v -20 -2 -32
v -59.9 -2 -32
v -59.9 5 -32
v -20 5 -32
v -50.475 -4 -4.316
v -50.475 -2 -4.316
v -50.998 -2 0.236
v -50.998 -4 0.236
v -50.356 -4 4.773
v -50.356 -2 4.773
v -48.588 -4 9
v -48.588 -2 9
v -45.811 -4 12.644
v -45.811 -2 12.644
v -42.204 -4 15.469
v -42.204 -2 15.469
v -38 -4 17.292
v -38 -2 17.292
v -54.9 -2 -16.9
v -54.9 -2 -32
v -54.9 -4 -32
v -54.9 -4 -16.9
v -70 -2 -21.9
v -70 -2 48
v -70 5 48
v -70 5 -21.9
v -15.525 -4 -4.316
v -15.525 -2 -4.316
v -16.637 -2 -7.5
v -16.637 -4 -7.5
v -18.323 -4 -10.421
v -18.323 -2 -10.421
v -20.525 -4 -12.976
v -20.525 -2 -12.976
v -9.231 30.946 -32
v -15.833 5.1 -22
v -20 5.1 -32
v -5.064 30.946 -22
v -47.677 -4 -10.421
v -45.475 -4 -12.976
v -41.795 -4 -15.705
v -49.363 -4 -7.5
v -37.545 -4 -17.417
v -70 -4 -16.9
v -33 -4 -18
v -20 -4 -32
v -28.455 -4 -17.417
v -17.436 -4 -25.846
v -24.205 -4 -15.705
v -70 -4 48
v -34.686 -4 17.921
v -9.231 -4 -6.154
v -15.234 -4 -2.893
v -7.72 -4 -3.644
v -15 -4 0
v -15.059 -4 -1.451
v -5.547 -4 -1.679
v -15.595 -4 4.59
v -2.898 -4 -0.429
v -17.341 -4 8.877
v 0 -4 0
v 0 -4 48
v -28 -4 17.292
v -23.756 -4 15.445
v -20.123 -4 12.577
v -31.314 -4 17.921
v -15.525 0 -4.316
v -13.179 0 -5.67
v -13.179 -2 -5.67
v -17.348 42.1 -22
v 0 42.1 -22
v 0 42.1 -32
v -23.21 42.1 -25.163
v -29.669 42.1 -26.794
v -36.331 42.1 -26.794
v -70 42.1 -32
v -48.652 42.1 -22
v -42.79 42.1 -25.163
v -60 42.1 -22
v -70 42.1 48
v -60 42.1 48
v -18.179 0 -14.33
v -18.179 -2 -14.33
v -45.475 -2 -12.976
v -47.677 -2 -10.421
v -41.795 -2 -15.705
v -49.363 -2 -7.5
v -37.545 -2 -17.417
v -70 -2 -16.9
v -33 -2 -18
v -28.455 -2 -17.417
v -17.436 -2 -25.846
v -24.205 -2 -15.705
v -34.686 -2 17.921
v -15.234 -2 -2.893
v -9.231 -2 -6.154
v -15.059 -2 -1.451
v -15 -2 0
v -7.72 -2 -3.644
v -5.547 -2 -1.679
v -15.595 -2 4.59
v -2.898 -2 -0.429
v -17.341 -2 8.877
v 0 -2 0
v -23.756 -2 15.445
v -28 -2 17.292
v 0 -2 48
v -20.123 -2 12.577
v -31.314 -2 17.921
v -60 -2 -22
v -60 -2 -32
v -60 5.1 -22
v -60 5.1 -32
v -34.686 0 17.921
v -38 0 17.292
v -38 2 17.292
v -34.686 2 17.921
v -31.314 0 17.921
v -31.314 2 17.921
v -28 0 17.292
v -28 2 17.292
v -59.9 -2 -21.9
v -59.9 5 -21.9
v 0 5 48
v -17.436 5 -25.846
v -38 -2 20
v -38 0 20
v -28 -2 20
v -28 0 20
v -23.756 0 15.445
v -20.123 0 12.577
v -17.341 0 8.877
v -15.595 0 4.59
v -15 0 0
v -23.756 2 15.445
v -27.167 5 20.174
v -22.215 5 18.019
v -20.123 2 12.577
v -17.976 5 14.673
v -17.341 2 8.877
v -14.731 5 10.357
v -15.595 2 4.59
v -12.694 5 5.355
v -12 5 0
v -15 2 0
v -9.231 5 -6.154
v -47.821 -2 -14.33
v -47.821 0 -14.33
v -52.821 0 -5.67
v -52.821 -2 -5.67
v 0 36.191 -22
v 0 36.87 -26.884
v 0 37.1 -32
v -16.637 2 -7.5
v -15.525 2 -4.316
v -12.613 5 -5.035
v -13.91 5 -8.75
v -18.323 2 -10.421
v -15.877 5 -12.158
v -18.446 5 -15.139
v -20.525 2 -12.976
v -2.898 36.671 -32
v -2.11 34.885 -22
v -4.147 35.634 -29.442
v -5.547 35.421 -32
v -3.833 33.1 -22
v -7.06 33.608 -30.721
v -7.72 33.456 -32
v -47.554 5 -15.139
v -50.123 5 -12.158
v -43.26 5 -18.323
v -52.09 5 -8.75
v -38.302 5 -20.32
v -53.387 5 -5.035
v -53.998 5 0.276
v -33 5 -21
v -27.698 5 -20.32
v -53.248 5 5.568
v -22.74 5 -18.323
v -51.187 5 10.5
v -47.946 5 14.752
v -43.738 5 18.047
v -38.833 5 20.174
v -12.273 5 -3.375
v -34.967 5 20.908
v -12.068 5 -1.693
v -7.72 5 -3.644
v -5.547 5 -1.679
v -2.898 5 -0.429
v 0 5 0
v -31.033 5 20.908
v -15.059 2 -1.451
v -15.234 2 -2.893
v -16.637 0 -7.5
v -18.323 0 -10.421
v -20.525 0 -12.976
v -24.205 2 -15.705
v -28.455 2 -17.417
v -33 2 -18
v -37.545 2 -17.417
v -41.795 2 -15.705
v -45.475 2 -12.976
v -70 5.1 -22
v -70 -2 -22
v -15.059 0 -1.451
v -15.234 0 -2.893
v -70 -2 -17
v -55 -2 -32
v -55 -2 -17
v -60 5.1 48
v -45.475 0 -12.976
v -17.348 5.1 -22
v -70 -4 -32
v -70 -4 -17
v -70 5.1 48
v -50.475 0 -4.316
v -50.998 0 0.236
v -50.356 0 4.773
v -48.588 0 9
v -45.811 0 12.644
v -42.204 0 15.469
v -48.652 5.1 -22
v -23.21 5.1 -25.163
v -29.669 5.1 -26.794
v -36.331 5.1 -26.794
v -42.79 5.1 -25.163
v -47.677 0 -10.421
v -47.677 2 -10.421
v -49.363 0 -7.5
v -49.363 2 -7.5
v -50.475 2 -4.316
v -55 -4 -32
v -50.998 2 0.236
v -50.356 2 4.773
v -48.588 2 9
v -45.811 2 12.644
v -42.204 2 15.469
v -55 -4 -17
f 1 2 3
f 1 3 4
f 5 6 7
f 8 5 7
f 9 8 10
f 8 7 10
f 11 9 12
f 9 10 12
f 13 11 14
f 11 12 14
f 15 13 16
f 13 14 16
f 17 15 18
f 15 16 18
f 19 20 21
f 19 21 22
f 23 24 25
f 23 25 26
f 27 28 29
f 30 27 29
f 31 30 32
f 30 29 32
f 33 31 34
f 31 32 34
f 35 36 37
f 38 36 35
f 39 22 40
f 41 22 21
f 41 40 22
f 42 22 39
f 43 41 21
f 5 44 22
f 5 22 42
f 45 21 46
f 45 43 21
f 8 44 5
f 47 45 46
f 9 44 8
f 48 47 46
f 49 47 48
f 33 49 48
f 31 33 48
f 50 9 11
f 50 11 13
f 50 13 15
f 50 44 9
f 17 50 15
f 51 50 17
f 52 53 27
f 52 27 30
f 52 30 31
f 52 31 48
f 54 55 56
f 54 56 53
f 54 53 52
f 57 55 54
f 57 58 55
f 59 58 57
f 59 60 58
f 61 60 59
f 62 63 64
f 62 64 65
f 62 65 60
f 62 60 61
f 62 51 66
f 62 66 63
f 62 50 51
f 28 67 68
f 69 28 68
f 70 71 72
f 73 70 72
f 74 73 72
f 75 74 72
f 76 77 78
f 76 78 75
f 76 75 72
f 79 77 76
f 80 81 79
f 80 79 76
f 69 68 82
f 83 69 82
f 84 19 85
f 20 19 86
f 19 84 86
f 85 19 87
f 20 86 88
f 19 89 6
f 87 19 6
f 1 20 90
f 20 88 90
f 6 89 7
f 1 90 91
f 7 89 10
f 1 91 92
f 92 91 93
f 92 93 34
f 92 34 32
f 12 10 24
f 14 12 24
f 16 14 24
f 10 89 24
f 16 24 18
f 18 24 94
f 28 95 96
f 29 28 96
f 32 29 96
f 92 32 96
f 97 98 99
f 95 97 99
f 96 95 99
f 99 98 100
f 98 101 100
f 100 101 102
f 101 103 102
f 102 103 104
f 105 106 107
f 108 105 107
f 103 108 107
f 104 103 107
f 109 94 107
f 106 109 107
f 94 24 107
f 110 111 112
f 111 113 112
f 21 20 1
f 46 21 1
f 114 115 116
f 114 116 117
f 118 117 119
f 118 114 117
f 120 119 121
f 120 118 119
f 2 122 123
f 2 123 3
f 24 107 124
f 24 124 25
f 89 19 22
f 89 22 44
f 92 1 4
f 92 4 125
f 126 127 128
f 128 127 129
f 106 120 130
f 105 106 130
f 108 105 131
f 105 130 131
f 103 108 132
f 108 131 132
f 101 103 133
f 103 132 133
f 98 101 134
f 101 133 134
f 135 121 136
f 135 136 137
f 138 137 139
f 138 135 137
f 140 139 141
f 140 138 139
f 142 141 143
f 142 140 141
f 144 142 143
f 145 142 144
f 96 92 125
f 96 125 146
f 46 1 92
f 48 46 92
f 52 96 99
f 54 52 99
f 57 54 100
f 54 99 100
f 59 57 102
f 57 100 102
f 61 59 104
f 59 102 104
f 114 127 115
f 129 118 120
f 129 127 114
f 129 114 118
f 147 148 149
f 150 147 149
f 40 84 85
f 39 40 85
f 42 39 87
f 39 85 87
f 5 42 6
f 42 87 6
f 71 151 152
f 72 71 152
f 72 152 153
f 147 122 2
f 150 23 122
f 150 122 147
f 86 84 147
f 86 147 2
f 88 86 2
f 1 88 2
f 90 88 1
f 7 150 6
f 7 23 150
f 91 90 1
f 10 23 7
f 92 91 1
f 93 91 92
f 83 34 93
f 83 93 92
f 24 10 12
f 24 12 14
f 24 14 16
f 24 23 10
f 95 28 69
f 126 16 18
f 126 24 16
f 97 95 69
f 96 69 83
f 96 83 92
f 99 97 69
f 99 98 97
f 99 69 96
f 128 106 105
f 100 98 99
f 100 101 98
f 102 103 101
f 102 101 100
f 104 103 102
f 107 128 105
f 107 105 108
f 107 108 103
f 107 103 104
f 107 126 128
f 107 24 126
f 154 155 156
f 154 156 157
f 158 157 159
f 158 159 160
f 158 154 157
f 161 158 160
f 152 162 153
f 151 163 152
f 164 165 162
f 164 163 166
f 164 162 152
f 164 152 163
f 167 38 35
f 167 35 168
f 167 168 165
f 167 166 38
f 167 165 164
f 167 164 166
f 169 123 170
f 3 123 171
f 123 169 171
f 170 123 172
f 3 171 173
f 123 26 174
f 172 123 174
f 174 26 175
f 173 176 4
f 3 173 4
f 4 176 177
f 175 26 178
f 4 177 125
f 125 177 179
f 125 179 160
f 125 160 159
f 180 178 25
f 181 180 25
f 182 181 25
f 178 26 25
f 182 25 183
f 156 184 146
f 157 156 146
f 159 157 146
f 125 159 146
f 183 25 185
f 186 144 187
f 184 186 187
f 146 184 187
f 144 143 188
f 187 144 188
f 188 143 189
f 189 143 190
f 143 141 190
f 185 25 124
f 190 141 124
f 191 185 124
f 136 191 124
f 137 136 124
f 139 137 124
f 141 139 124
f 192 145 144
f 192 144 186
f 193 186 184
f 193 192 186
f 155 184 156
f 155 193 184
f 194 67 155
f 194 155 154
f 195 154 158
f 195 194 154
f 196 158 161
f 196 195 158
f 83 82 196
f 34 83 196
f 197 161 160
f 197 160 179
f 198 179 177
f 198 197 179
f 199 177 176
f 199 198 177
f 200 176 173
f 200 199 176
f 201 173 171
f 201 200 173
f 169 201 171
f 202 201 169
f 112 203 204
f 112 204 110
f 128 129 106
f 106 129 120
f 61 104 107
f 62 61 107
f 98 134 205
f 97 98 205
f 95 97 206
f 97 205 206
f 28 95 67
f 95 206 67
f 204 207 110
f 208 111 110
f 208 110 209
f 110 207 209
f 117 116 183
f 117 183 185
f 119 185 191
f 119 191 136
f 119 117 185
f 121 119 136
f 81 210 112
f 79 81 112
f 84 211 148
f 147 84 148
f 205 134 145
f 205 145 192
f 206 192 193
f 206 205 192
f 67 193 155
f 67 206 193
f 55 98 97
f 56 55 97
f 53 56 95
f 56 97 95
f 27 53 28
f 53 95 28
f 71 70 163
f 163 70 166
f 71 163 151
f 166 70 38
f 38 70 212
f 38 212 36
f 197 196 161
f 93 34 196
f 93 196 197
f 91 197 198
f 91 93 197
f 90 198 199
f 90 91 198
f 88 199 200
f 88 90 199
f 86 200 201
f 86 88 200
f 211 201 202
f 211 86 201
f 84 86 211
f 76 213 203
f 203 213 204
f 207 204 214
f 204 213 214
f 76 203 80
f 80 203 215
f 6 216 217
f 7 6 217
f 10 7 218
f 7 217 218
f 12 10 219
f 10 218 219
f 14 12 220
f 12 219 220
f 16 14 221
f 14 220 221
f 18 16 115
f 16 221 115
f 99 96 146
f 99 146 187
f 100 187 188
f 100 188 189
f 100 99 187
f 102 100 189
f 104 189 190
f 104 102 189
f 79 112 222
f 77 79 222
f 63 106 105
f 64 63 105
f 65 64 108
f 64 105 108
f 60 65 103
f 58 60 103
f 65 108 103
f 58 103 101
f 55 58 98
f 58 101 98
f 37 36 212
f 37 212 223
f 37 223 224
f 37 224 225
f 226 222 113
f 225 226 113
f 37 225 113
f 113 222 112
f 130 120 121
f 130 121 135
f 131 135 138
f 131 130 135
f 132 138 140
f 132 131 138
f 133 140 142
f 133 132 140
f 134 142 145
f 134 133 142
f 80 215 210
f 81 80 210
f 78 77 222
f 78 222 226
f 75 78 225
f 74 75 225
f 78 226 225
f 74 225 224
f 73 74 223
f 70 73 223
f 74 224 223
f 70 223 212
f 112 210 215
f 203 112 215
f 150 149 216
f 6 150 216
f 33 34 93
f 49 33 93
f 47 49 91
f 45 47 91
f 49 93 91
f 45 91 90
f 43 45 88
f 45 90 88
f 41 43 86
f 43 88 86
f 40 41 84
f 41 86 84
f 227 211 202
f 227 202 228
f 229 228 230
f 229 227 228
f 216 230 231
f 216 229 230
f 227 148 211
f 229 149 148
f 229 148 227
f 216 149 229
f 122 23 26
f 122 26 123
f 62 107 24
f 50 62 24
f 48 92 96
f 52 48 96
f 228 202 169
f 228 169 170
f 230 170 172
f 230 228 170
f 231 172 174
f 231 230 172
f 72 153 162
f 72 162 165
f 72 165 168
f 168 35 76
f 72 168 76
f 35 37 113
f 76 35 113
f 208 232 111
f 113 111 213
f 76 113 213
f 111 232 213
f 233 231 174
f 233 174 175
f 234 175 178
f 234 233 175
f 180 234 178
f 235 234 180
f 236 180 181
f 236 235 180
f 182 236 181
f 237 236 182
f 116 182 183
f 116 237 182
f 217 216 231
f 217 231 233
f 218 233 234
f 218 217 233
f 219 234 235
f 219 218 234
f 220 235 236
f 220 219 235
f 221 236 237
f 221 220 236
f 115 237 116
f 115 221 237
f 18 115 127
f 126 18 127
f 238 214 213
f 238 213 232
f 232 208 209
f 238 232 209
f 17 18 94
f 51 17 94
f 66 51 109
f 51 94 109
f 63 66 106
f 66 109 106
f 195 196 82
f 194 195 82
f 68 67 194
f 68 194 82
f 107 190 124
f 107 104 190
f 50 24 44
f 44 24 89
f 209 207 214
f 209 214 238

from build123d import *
from build123d import SkipClean  # not in build123d's __all__

# Parameters (mm, degrees)
F3_DEPTH       = 2
F4_DEPTH       = 5
F5_START       = 2
F5_DEPTH       = 2
F6_SIZE        = 3
F7_W           = 15
F7_H           = 15
F8_DEPTH       = 4
F9_START       = 2
F9_DEPTH       = 2
F2_W           = 10
F2_H           = 10
F10_DEPTH      = 5.1
F10_DEPTH_BACK = 2
F11_W          = 10
F11_H          = 10
F12_DEPTH      = 37


with BuildPart() as f3:
    # F2 (on Front) → F3 (new body)
    with BuildSketch(Plane.XZ):
        with BuildLine():
            Line((0, 0), (0, 48))
            Line((0, 48), (-70, 48))
            Line((-70, 48), (-70, -21.9))
            Line((-70, -21.9), (-59.9, -21.9))
            Line((-59.9, -21.9), (-59.9, -32))
            Line((-59.9, -32), (-26.6666666667, -32))
            Line((-26.6666666667, -32), (-20, -32))
            Line((-20, -32), (-17.4358974359, -25.8461538462))
            Line((-17.4358974359, -25.8461538462), (-9.2307692308, -6.1538461538))
            ThreePointArc((-9.2307692308, -6.1538461538), (-5.5470019623, -1.6794970566), (0, 0))
        make_face()
        with BuildLine():
            ThreePointArc((-28, 17.2916164658), (-18.6125054301, 10.8166538264), (-15, 0))
            ThreePointArc((-15, 0), (-15.1317372924, -2.1737497126), (-15.5250208681, -4.315681214))
            Line((-15.5250208681, -4.315681214), (-13.1794919243, -5.6698729811))
            Line((-13.1794919243, -5.6698729811), (-15.6794919243, -10))
            Line((-15.6794919243, -10), (-18.1794919243, -14.3301270189))
            Line((-18.1794919243, -14.3301270189), (-20.5250208681, -12.9759352518))
            ThreePointArc((-20.5250208681, -12.9759352518), (-33, -18), (-45.4749791319, -12.9759352518))
            Line((-45.4749791319, -12.9759352518), (-47.8205080757, -14.3301270189))
            Line((-47.8205080757, -14.3301270189), (-50.3205080757, -10))
            Line((-50.3205080757, -10), (-52.8205080757, -5.6698729811))
            Line((-52.8205080757, -5.6698729811), (-50.4749791319, -4.315681214))
            ThreePointArc((-50.4749791319, -4.315681214), (-48.5884572681, 9), (-38, 17.2916164658))
            Line((-38, 17.2916164658), (-38, 20))
            Line((-38, 20), (-33, 20))
            Line((-33, 20), (-28, 20))
            Line((-28, 20), (-28, 17.2916164658))
        make_face(mode=Mode.SUBTRACT)
    extrude(amount=F3_DEPTH)

    # F2 (on Front) → F4 (join)
    with BuildSketch(Plane.XZ):
        with BuildLine():
            Line((0, 0), (0, 48))
            Line((0, 48), (-70, 48))
            Line((-70, 48), (-70, -21.9))
            Line((-70, -21.9), (-59.9, -21.9))
            Line((-59.9, -21.9), (-59.9, -32))
            Line((-59.9, -32), (-26.6666666667, -32))
            Line((-26.6666666667, -32), (-20, -32))
            Line((-20, -32), (-17.4358974359, -25.8461538462))
            Line((-17.4358974359, -25.8461538462), (-9.2307692308, -6.1538461538))
            ThreePointArc((-9.2307692308, -6.1538461538), (-5.5470019623, -1.6794970566), (0, 0))
        make_face()
        with BuildLine():
            ThreePointArc((-28, 17.2916164658), (-18.6125054301, 10.8166538264), (-15, 0))
            ThreePointArc((-15, 0), (-15.1317372924, -2.1737497126), (-15.5250208681, -4.315681214))
            Line((-15.5250208681, -4.315681214), (-13.1794919243, -5.6698729811))
            Line((-13.1794919243, -5.6698729811), (-15.6794919243, -10))
            Line((-15.6794919243, -10), (-18.1794919243, -14.3301270189))
            Line((-18.1794919243, -14.3301270189), (-20.5250208681, -12.9759352518))
            ThreePointArc((-20.5250208681, -12.9759352518), (-33, -18), (-45.4749791319, -12.9759352518))
            Line((-45.4749791319, -12.9759352518), (-47.8205080757, -14.3301270189))
            Line((-47.8205080757, -14.3301270189), (-50.3205080757, -10))
            Line((-50.3205080757, -10), (-52.8205080757, -5.6698729811))
            Line((-52.8205080757, -5.6698729811), (-50.4749791319, -4.315681214))
            ThreePointArc((-50.4749791319, -4.315681214), (-48.5884572681, 9), (-38, 17.2916164658))
            Line((-38, 17.2916164658), (-38, 20))
            Line((-38, 20), (-33, 20))
            Line((-33, 20), (-28, 20))
            Line((-28, 20), (-28, 17.2916164658))
        make_face(mode=Mode.SUBTRACT)
        with BuildLine():
            ThreePointArc((-45.4749791319, -12.9759352518), (-48.5884572681, -9), (-50.4749791319, -4.315681214))
            Line((-50.4749791319, -4.315681214), (-52.8205080757, -5.6698729811))
            Line((-52.8205080757, -5.6698729811), (-50.3205080757, -10))
            Line((-50.3205080757, -10), (-47.8205080757, -14.3301270189))
            Line((-47.8205080757, -14.3301270189), (-45.4749791319, -12.9759352518))
        make_face()
        with BuildLine():
            Line((-13.1794919243, -5.6698729811), (-15.5250208681, -4.315681214))
            ThreePointArc((-15.5250208681, -4.315681214), (-17.4115427319, -9), (-20.5250208681, -12.9759352518))
            Line((-20.5250208681, -12.9759352518), (-18.1794919243, -14.3301270189))
            Line((-18.1794919243, -14.3301270189), (-15.6794919243, -10))
            Line((-15.6794919243, -10), (-13.1794919243, -5.6698729811))
        make_face()
        with BuildLine():
            ThreePointArc((-38, 17.2916164658), (-33, 18), (-28, 17.2916164658))
            Line((-28, 17.2916164658), (-28, 20))
            Line((-28, 20), (-33, 20))
            Line((-33, 20), (-38, 20))
            Line((-38, 20), (-38, 17.2916164658))
        make_face()
    with SkipClean():  # cleaning this boolean's faces spoils the solid; the shape is the same uncleaned
        extrude(amount=-F4_DEPTH)

    # F6
    f6_edges = [f3.edges().sort_by_distance(p)[0] for p in [
        (-28, 5, -17.291616),
    ]]
    chamfer(f6_edges, length=F6_SIZE)


with BuildPart() as f5:
    # F2 (on Front) → F5 (new body)
    with BuildSketch(Plane.XZ.offset(F5_START)):
        with BuildLine():
            Line((0, 0), (0, 48))
            Line((0, 48), (-70, 48))
            Line((-70, 48), (-70, -21.9))
            Line((-70, -21.9), (-59.9, -21.9))
            Line((-59.9, -21.9), (-59.9, -32))
            Line((-59.9, -32), (-26.6666666667, -32))
            Line((-26.6666666667, -32), (-20, -32))
            Line((-20, -32), (-17.4358974359, -25.8461538462))
            Line((-17.4358974359, -25.8461538462), (-9.2307692308, -6.1538461538))
            ThreePointArc((-9.2307692308, -6.1538461538), (-5.5470019623, -1.6794970566), (0, 0))
        make_face()
        with BuildLine():
            ThreePointArc((-28, 17.2916164658), (-18.6125054301, 10.8166538264), (-15, 0))
            ThreePointArc((-15, 0), (-15.1317372924, -2.1737497126), (-15.5250208681, -4.315681214))
            Line((-15.5250208681, -4.315681214), (-13.1794919243, -5.6698729811))
            Line((-13.1794919243, -5.6698729811), (-15.6794919243, -10))
            Line((-15.6794919243, -10), (-18.1794919243, -14.3301270189))
            Line((-18.1794919243, -14.3301270189), (-20.5250208681, -12.9759352518))
            ThreePointArc((-20.5250208681, -12.9759352518), (-33, -18), (-45.4749791319, -12.9759352518))
            Line((-45.4749791319, -12.9759352518), (-47.8205080757, -14.3301270189))
            Line((-47.8205080757, -14.3301270189), (-50.3205080757, -10))
            Line((-50.3205080757, -10), (-52.8205080757, -5.6698729811))
            Line((-52.8205080757, -5.6698729811), (-50.4749791319, -4.315681214))
            ThreePointArc((-50.4749791319, -4.315681214), (-48.5884572681, 9), (-38, 17.2916164658))
            Line((-38, 17.2916164658), (-38, 20))
            Line((-38, 20), (-33, 20))
            Line((-33, 20), (-28, 20))
            Line((-28, 20), (-28, 17.2916164658))
        make_face(mode=Mode.SUBTRACT)
        with BuildLine():
            ThreePointArc((-45.4749791319, -12.9759352518), (-48.5884572681, -9), (-50.4749791319, -4.315681214))
            Line((-50.4749791319, -4.315681214), (-52.8205080757, -5.6698729811))
            Line((-52.8205080757, -5.6698729811), (-50.3205080757, -10))
            Line((-50.3205080757, -10), (-47.8205080757, -14.3301270189))
            Line((-47.8205080757, -14.3301270189), (-45.4749791319, -12.9759352518))
        make_face()
        with BuildLine():
            Line((-13.1794919243, -5.6698729811), (-15.5250208681, -4.315681214))
            ThreePointArc((-15.5250208681, -4.315681214), (-17.4115427319, -9), (-20.5250208681, -12.9759352518))
            Line((-20.5250208681, -12.9759352518), (-18.1794919243, -14.3301270189))
            Line((-18.1794919243, -14.3301270189), (-15.6794919243, -10))
            Line((-15.6794919243, -10), (-13.1794919243, -5.6698729811))
        make_face()
        with BuildLine():
            ThreePointArc((-38, 17.2916164658), (-33, 18), (-28, 17.2916164658))
            Line((-28, 17.2916164658), (-28, 20))
            Line((-28, 20), (-33, 20))
            Line((-33, 20), (-38, 20))
            Line((-38, 20), (-38, 17.2916164658))
        make_face()
    extrude(amount=F5_DEPTH)

    # F7 (on Front) → F8 (cut)
    with BuildSketch(Plane.XZ):
        with Locations((-62.5, -24.5)):
            Rectangle(F7_W, F7_H)
        Polygon((-55, -17), (-55, -32), (-54.9, -32), (-54.9, -16.9), (-70, -16.9), (-70, -17), align=None)
    extrude(amount=F8_DEPTH, mode=Mode.SUBTRACT)


with BuildPart() as f9:
    # F7 (on Front) → F9 (new body)
    with BuildSketch(Plane.XZ.offset(F9_START)):
        with Locations((-62.5, -24.5)):
            Rectangle(F7_W, F7_H)
    extrude(amount=F9_DEPTH)

    # F2 (on Front) → F10 (join, two sides)
    with BuildSketch(Plane.XZ) as f10_sk:
        with Locations((-65, -27)):
            Rectangle(F2_W, F2_H)
    extrude(amount=-F10_DEPTH)
    extrude(f10_sk.sketch, amount=F10_DEPTH_BACK)

    # F11 (on face) → F12 (join)
    with BuildSketch(Plane(origin=(0, 5.1, 0), x_dir=(-1, 0, 0), z_dir=(0, 1, 0))):
        with BuildLine():
            Line((0, -32), (60, -32))
            Line((60, -32), (60, -22))
            Line((60, -22), (48.6524758425, -22))
            ThreePointArc((48.6524758425, -22), (33, -27), (17.3475241575, -22))
            Line((17.3475241575, -22), (0, -22))
            Line((0, -22), (0, -32))
        make_face()
        Polygon((60, -22), (70, -22), (70, 48), (60, 48), (60, 0), align=None)
        with Locations((65, -27)):
            Rectangle(F11_W, F11_H)
    extrude(amount=F12_DEPTH)

    # F14: sweep along a path in F14_path
    with BuildLine(Plane(origin=(-20, 5, -32), x_dir=(-0.3846153846, 0, -0.9230769231), z_dir=(-0.9230769231, 0, 0.3846153846))) as f14_path:
        Line((0, 0), (-28, 0))
    # F13 (on face) → F14 (sweep, cut)
    with BuildSketch(Plane(origin=(0, 0, -32), x_dir=(1, 0, 0), z_dir=(0, 0, -1))):
        with BuildLine():
            Line((0, -5.1), (-20, -5.1))
            Line((-20, -5.1), (-9.2307692308, -30.9461538462))
            ThreePointArc((-9.2307692308, -30.9461538462), (-5.5470019623, -35.4205029434), (0, -37.1))
            Line((0, -37.1), (0, -5.1))
        make_face()
    sweep(path=f14_path.line, mode=Mode.SUBTRACT)


solid = Compound([f3.part, f5.part, f9.part])
